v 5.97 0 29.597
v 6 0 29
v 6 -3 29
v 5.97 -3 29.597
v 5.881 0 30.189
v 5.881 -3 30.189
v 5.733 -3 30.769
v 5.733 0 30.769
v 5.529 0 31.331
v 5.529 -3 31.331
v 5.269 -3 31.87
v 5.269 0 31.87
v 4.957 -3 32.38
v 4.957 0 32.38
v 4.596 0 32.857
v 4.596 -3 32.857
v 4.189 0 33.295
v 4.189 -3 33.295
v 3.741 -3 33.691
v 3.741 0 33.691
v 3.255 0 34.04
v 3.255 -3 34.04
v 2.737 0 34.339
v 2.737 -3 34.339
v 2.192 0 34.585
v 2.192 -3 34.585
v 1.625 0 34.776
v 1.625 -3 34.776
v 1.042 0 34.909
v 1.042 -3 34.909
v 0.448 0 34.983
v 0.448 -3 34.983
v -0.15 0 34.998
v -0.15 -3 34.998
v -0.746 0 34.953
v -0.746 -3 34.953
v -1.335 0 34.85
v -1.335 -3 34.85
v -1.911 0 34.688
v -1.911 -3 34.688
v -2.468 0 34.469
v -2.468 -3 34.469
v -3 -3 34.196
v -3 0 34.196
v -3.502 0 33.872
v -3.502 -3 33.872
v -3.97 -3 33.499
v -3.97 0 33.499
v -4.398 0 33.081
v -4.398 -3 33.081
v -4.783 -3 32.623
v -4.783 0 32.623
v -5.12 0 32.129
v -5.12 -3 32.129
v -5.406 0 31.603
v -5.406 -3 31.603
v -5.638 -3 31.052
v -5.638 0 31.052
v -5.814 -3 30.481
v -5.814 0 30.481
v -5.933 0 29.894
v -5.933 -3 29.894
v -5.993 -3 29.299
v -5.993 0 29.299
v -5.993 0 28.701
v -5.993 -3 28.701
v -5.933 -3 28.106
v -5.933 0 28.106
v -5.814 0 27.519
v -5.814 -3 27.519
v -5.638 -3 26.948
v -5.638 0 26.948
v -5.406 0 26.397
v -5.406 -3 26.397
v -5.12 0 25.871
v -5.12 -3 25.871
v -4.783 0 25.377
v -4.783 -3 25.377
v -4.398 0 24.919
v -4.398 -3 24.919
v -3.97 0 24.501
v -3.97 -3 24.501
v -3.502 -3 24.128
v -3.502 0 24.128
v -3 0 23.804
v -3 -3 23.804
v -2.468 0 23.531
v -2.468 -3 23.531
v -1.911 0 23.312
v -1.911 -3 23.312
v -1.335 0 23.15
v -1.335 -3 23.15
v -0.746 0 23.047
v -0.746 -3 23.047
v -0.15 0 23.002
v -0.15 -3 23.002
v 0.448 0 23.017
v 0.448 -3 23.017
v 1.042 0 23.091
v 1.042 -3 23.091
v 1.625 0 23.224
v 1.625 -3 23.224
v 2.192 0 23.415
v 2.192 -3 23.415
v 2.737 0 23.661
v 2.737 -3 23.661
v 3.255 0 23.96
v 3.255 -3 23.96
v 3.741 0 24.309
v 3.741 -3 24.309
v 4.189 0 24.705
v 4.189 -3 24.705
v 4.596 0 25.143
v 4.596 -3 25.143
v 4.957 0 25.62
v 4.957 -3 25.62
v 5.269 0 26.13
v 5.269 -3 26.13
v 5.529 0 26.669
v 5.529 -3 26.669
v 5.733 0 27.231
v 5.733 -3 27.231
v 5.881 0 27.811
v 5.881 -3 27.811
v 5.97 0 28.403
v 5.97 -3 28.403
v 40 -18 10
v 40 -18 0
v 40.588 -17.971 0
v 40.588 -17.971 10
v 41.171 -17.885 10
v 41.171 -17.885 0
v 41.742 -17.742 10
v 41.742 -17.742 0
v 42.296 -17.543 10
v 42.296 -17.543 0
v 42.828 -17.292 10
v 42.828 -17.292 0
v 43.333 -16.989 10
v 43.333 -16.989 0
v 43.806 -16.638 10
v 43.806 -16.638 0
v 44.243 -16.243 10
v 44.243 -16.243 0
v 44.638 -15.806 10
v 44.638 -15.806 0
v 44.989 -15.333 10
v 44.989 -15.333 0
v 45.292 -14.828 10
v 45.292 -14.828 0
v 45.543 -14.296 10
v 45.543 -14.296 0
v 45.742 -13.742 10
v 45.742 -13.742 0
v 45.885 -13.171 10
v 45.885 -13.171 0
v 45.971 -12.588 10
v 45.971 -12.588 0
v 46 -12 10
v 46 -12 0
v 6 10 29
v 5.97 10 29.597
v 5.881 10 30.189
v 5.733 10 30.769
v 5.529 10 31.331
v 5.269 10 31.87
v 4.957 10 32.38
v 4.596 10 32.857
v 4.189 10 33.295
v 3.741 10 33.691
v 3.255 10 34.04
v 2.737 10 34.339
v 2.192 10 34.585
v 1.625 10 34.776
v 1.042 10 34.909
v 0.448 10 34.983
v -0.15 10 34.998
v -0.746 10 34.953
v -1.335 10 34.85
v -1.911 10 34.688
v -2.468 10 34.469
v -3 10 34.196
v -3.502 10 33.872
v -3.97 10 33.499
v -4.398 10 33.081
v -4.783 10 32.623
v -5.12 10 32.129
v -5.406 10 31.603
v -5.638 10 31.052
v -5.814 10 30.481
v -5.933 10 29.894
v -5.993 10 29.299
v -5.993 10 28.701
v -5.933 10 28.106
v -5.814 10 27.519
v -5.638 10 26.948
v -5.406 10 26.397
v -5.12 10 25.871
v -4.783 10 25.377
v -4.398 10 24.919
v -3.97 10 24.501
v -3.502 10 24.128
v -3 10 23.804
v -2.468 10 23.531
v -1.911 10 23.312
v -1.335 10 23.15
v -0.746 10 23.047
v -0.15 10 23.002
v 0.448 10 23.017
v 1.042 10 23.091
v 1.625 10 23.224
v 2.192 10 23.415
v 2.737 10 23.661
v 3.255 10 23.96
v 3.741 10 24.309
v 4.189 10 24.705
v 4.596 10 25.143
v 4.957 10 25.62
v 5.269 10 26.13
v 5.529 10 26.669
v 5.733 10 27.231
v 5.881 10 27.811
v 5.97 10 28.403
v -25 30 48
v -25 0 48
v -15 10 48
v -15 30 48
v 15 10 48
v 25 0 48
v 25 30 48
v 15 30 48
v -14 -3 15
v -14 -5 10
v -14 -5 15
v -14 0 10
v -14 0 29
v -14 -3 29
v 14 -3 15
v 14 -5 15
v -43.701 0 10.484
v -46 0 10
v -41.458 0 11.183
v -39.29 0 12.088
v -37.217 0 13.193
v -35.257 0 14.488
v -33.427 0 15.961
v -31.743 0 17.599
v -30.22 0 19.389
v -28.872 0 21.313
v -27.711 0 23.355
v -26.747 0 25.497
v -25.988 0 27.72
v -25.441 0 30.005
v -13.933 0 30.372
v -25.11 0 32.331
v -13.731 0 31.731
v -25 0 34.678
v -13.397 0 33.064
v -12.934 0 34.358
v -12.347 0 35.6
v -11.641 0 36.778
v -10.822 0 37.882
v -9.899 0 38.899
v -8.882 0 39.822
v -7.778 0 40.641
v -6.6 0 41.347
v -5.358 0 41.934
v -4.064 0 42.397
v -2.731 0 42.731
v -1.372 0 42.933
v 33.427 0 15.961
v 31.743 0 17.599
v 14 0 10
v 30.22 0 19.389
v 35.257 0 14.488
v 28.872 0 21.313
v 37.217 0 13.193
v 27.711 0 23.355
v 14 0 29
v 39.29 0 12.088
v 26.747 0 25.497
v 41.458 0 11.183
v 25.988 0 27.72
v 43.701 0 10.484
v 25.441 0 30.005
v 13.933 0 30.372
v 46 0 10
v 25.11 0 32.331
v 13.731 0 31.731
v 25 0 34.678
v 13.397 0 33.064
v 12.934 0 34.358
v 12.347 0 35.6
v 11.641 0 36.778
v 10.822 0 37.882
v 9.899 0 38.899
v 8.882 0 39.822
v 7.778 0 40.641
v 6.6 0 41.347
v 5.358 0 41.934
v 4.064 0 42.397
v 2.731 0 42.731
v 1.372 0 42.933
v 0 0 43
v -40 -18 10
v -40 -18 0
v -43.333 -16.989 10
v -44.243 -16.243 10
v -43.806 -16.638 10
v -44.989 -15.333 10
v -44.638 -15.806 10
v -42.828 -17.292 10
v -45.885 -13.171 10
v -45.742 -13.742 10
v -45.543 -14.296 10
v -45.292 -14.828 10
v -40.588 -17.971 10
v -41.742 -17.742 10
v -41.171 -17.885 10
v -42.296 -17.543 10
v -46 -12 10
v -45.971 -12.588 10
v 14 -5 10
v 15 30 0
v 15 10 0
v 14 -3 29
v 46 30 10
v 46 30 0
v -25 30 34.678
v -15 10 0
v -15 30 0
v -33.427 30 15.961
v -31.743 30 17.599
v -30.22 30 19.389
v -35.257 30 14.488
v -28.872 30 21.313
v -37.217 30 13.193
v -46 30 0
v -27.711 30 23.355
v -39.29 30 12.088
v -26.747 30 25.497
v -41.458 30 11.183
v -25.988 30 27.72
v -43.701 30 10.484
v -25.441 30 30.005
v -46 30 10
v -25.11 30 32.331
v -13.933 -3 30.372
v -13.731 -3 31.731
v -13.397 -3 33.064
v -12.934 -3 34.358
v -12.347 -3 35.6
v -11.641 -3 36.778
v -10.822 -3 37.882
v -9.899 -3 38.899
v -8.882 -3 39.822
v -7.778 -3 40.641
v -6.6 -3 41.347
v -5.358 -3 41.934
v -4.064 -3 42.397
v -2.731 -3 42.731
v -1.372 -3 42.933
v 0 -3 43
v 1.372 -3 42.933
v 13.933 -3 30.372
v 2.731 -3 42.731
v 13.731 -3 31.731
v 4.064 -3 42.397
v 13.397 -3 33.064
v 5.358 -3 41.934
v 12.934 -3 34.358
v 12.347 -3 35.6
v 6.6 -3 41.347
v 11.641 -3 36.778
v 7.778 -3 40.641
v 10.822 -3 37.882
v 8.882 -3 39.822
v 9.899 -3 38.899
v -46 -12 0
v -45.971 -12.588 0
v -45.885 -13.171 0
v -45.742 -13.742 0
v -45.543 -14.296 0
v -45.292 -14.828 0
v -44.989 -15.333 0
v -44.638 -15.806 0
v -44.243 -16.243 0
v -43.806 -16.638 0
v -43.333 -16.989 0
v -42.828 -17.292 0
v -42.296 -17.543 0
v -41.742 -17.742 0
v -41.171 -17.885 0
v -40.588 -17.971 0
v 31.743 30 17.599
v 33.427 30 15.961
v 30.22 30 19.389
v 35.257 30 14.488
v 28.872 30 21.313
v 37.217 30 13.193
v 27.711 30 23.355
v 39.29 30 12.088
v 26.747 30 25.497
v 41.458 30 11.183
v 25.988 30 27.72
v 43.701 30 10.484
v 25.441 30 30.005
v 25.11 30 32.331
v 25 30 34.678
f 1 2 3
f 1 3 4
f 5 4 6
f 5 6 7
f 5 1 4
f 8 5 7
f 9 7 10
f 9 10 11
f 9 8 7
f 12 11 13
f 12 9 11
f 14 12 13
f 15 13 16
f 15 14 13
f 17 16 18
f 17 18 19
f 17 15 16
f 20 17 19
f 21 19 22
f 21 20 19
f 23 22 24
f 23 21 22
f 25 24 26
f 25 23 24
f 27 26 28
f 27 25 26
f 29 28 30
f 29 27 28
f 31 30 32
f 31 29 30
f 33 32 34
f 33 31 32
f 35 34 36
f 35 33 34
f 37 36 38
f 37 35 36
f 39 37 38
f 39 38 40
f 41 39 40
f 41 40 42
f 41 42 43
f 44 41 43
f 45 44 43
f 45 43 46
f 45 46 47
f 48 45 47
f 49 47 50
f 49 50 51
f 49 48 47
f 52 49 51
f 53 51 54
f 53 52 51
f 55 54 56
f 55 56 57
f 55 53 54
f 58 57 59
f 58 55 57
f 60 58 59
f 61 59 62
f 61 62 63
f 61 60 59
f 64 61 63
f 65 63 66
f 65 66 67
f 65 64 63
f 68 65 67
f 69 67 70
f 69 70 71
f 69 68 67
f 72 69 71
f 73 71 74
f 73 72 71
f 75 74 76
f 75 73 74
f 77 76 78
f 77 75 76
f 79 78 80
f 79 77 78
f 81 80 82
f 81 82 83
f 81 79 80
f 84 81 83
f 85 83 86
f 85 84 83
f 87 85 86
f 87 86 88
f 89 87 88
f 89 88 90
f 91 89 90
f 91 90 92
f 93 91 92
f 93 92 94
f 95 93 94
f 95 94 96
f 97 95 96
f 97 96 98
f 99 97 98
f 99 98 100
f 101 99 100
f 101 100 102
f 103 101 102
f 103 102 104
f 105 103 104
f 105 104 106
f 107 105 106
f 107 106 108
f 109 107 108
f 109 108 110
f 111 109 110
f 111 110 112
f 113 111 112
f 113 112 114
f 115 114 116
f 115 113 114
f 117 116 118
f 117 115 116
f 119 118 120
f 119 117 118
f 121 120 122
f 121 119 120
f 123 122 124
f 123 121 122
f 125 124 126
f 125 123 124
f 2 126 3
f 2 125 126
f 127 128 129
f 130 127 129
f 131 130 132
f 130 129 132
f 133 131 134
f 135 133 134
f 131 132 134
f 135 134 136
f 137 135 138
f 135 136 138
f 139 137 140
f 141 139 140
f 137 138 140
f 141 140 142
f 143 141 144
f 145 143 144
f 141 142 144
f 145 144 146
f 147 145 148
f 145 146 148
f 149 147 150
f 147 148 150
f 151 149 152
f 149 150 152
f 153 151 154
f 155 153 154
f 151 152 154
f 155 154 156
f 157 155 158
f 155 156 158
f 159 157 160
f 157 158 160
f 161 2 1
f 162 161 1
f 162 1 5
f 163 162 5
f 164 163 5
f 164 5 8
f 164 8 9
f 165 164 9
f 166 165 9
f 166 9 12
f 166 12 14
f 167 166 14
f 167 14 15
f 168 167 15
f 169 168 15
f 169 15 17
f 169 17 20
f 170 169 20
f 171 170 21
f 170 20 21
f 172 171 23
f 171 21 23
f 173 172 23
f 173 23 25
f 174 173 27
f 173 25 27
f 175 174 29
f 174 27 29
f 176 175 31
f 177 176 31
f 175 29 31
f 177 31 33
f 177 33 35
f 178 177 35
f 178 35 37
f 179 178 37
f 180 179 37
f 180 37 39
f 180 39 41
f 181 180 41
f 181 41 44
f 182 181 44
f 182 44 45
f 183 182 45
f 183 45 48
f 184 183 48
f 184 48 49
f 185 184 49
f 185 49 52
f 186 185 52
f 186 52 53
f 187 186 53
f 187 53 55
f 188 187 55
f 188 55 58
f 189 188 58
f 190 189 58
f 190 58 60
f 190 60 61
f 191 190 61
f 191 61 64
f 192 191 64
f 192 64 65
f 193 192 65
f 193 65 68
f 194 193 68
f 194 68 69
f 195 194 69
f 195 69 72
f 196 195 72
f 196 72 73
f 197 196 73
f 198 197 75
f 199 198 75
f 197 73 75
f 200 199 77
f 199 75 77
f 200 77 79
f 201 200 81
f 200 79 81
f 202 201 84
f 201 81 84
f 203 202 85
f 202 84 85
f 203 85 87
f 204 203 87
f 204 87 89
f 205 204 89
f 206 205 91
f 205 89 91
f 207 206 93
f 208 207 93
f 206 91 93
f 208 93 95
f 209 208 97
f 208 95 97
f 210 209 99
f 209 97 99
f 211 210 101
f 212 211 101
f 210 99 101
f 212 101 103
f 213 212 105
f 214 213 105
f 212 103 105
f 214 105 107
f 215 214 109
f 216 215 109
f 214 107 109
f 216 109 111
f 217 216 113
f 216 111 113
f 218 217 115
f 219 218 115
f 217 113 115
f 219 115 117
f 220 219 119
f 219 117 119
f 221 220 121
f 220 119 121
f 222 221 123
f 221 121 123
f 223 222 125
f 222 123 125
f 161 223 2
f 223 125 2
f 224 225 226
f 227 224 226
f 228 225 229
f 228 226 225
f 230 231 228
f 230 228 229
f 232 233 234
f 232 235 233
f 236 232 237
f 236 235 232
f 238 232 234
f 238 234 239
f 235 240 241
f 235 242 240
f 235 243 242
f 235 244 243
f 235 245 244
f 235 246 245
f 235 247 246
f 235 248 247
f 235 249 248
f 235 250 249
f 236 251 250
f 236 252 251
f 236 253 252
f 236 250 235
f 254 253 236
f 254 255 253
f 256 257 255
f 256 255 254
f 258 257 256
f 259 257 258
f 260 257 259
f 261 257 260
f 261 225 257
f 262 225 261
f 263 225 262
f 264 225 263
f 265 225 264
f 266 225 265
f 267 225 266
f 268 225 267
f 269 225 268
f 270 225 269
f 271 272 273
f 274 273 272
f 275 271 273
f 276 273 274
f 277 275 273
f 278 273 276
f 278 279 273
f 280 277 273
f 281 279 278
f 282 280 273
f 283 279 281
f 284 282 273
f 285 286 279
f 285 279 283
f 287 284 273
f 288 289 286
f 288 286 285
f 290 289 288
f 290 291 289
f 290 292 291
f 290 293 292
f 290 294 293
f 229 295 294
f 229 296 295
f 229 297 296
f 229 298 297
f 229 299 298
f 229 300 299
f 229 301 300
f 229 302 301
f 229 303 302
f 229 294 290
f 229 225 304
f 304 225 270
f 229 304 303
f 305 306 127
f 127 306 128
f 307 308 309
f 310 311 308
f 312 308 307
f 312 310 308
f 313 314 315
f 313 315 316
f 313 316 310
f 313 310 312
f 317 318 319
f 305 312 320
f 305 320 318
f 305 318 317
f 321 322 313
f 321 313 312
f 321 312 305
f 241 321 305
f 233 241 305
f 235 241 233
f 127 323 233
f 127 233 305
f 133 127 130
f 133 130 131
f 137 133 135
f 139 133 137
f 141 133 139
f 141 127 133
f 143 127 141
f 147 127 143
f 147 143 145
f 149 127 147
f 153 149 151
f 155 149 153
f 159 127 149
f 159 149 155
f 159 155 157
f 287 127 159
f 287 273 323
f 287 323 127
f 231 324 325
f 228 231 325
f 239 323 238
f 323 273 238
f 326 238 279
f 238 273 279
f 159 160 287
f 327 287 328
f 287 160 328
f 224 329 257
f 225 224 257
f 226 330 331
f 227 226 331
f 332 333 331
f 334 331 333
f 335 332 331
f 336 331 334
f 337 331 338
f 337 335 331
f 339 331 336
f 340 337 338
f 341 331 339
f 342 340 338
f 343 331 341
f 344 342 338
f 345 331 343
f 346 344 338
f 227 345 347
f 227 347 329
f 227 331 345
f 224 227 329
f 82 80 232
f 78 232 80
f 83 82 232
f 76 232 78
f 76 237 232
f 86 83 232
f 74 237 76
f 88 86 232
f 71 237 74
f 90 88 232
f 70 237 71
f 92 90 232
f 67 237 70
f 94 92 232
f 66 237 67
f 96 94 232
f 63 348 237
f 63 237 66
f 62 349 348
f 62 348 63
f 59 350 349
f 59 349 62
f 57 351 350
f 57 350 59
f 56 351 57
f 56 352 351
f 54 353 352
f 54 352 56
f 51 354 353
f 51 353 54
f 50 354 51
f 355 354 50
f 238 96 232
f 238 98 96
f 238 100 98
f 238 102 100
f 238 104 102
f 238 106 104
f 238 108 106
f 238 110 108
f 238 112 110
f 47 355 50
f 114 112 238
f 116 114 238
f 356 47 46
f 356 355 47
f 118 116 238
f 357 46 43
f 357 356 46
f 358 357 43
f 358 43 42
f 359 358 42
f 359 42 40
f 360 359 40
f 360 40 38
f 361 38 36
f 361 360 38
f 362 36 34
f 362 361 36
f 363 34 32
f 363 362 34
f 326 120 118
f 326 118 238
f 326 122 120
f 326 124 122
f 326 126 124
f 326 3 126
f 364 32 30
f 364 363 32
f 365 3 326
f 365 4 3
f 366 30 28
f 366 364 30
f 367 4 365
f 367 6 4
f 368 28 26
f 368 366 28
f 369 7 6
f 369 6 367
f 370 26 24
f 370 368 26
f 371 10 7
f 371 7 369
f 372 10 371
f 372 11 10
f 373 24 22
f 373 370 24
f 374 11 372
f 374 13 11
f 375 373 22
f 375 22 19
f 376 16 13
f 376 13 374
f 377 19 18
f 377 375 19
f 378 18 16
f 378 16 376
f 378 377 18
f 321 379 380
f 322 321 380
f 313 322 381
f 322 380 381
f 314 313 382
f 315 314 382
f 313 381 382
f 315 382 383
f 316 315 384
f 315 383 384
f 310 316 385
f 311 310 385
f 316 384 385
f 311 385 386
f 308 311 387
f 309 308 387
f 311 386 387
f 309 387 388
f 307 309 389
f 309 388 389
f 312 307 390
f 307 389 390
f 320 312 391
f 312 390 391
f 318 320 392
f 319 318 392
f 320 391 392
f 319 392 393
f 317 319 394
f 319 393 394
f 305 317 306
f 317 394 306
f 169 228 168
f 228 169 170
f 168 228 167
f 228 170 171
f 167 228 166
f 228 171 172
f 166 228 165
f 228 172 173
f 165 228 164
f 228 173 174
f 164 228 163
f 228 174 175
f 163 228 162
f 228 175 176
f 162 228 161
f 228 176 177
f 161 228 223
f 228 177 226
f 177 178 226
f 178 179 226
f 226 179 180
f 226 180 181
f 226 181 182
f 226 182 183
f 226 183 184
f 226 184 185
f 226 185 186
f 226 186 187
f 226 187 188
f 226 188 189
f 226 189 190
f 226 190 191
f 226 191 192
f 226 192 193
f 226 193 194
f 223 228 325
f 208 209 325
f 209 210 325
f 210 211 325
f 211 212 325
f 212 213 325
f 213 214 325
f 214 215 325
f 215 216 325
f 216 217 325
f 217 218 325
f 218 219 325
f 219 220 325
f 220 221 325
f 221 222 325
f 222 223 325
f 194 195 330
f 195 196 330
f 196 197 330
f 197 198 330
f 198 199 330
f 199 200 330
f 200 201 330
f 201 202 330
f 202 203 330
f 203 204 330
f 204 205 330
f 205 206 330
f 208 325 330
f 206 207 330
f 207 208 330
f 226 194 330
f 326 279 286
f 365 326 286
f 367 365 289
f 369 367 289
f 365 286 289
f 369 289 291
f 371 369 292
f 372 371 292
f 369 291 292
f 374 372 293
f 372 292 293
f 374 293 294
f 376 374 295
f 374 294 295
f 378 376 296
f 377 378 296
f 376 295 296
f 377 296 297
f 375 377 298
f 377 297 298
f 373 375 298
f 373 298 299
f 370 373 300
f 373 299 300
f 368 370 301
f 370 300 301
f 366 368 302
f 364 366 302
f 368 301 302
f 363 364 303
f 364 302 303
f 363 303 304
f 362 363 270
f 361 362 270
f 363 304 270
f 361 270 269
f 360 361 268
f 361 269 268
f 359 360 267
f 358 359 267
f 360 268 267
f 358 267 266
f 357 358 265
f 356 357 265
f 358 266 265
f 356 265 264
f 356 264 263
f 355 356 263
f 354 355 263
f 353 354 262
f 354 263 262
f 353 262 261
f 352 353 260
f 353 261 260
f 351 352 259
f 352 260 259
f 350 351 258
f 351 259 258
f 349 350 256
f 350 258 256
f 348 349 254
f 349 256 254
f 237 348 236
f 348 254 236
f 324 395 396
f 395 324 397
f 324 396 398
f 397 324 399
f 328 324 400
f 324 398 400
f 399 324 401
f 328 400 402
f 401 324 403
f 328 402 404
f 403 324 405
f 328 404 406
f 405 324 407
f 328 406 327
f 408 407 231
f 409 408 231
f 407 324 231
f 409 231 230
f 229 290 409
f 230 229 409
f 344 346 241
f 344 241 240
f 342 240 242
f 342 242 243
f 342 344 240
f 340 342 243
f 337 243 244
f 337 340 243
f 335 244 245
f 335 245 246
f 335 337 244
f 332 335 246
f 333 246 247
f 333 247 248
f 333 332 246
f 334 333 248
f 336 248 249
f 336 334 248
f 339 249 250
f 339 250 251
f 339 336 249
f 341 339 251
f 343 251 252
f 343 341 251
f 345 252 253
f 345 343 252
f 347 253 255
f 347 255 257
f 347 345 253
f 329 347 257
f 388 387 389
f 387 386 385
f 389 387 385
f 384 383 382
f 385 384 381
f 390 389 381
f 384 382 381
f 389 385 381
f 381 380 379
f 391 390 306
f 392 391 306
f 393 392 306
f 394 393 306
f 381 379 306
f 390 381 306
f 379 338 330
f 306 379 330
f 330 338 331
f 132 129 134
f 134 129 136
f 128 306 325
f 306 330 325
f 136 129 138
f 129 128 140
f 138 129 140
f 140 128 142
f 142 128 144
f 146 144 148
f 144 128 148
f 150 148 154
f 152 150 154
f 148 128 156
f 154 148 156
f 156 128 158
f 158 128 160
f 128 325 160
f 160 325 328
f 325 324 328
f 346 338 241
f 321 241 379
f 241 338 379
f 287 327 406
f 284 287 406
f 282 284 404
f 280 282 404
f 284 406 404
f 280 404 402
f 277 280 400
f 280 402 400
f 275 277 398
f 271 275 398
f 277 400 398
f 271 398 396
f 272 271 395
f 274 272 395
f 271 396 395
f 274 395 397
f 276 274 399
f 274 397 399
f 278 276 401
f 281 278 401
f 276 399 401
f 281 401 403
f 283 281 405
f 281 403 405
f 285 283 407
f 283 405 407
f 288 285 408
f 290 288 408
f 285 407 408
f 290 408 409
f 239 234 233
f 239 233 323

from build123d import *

# Parameters (mm, degrees)
F1_DEPTH    = 10
F3_DEPTH    = 48
F4_T1_DEPTH = 30
F5_T1_DEPTH = 30
F6_R        = 6
F7_DEPTH    = 3
F8_W        = 28
F8_H        = 5
F9_DEPTH    = 2
F10_DEPTH   = 25


# Not quite as in the source:
# - a fillet or chamfer that OpenCascade refuses, or shapes differently, is made with other operations: its cross-section is extruded or revolved along the edge and cut away or added


with BuildPart() as f1:
    # F0 (on Top) → F1 (new body)
    with BuildSketch(Plane.XY):
        with BuildLine():
            Line((-15, 30), (-46, 30))
            Line((-46, 30), (-46, -12))
            ThreePointArc((-46, -12), (-44.2426406871, -16.2426406871), (-40, -18))
            Line((-40, -18), (40, -18))
            ThreePointArc((40, -18), (44.2426406871, -16.2426406871), (46, -12))
            Line((46, -12), (46, 30))
            Line((46, 30), (15, 30))
            Line((15, 30), (15, 10))
            Line((15, 10), (-15, 10))
            Line((-15, 10), (-15, 30))
        make_face()
    extrude(amount=F1_DEPTH)

    # F2 (on Top) → F3 (join)
    with BuildSketch(Plane.XY):
        Polygon((-15, 30), (-25, 30), (-25, 0), (25, 0), (25, 30), (15, 30), (15, 10), (-15, 10), align=None)
    extrude(amount=F3_DEPTH)

    # F4: fillet of radius 25 on 1 edges, made by hand

    # F4_s2 → F4_t1 (join)
    with BuildSketch(Plane.XZ.offset(-30)):
        with BuildLine():
            ThreePointArc((-46, 10), (-30.9605672353, 18.4760736125), (-25, 34.6779253585))
            Line((-25, 34.6779253585), (-25, 10))
            Line((-25, 10), (-46, 10))
        make_face()
    extrude(amount=F4_T1_DEPTH)

    # F5: fillet of radius 25 on 1 edges, made by hand

    # F5_s2 → F5_t1 (join)
    with BuildSketch(Plane.XZ.offset(-30)):
        with BuildLine():
            ThreePointArc((46, 10), (30.9605672353, 18.4760736125), (25, 34.6779253585))
            Line((25, 34.6779253585), (25, 10))
            Line((25, 10), (46, 10))
        make_face()
    extrude(amount=F5_T1_DEPTH)

    # F6 (on face) → F7 (join)
    with BuildSketch(Plane.XZ):
        with BuildLine():
            Line((14, 10), (14, 29))
            ThreePointArc((14, 29), (0, 43), (-14, 29))
            Line((-14, 29), (-14, 10))
            Line((-14, 10), (14, 10))
        make_face()
        with Locations((0, 29)):
            Circle(F6_R, mode=Mode.SUBTRACT)
    extrude(amount=F7_DEPTH)

    # F8 (on face) → F9 (join)
    with BuildSketch(Plane.XZ.offset(3)):
        with Locations((0, 12.5)):
            Rectangle(F8_W, F8_H)
    extrude(amount=F9_DEPTH)

    # F10 (cut): a face of the model
    f10_faces = [f1.faces().sort_by_distance(p)[0] for p in [
        (0, 0, 29),
    ]]
    extrude(f10_faces, amount=-F10_DEPTH, mode=Mode.SUBTRACT)


solid = f1.part
